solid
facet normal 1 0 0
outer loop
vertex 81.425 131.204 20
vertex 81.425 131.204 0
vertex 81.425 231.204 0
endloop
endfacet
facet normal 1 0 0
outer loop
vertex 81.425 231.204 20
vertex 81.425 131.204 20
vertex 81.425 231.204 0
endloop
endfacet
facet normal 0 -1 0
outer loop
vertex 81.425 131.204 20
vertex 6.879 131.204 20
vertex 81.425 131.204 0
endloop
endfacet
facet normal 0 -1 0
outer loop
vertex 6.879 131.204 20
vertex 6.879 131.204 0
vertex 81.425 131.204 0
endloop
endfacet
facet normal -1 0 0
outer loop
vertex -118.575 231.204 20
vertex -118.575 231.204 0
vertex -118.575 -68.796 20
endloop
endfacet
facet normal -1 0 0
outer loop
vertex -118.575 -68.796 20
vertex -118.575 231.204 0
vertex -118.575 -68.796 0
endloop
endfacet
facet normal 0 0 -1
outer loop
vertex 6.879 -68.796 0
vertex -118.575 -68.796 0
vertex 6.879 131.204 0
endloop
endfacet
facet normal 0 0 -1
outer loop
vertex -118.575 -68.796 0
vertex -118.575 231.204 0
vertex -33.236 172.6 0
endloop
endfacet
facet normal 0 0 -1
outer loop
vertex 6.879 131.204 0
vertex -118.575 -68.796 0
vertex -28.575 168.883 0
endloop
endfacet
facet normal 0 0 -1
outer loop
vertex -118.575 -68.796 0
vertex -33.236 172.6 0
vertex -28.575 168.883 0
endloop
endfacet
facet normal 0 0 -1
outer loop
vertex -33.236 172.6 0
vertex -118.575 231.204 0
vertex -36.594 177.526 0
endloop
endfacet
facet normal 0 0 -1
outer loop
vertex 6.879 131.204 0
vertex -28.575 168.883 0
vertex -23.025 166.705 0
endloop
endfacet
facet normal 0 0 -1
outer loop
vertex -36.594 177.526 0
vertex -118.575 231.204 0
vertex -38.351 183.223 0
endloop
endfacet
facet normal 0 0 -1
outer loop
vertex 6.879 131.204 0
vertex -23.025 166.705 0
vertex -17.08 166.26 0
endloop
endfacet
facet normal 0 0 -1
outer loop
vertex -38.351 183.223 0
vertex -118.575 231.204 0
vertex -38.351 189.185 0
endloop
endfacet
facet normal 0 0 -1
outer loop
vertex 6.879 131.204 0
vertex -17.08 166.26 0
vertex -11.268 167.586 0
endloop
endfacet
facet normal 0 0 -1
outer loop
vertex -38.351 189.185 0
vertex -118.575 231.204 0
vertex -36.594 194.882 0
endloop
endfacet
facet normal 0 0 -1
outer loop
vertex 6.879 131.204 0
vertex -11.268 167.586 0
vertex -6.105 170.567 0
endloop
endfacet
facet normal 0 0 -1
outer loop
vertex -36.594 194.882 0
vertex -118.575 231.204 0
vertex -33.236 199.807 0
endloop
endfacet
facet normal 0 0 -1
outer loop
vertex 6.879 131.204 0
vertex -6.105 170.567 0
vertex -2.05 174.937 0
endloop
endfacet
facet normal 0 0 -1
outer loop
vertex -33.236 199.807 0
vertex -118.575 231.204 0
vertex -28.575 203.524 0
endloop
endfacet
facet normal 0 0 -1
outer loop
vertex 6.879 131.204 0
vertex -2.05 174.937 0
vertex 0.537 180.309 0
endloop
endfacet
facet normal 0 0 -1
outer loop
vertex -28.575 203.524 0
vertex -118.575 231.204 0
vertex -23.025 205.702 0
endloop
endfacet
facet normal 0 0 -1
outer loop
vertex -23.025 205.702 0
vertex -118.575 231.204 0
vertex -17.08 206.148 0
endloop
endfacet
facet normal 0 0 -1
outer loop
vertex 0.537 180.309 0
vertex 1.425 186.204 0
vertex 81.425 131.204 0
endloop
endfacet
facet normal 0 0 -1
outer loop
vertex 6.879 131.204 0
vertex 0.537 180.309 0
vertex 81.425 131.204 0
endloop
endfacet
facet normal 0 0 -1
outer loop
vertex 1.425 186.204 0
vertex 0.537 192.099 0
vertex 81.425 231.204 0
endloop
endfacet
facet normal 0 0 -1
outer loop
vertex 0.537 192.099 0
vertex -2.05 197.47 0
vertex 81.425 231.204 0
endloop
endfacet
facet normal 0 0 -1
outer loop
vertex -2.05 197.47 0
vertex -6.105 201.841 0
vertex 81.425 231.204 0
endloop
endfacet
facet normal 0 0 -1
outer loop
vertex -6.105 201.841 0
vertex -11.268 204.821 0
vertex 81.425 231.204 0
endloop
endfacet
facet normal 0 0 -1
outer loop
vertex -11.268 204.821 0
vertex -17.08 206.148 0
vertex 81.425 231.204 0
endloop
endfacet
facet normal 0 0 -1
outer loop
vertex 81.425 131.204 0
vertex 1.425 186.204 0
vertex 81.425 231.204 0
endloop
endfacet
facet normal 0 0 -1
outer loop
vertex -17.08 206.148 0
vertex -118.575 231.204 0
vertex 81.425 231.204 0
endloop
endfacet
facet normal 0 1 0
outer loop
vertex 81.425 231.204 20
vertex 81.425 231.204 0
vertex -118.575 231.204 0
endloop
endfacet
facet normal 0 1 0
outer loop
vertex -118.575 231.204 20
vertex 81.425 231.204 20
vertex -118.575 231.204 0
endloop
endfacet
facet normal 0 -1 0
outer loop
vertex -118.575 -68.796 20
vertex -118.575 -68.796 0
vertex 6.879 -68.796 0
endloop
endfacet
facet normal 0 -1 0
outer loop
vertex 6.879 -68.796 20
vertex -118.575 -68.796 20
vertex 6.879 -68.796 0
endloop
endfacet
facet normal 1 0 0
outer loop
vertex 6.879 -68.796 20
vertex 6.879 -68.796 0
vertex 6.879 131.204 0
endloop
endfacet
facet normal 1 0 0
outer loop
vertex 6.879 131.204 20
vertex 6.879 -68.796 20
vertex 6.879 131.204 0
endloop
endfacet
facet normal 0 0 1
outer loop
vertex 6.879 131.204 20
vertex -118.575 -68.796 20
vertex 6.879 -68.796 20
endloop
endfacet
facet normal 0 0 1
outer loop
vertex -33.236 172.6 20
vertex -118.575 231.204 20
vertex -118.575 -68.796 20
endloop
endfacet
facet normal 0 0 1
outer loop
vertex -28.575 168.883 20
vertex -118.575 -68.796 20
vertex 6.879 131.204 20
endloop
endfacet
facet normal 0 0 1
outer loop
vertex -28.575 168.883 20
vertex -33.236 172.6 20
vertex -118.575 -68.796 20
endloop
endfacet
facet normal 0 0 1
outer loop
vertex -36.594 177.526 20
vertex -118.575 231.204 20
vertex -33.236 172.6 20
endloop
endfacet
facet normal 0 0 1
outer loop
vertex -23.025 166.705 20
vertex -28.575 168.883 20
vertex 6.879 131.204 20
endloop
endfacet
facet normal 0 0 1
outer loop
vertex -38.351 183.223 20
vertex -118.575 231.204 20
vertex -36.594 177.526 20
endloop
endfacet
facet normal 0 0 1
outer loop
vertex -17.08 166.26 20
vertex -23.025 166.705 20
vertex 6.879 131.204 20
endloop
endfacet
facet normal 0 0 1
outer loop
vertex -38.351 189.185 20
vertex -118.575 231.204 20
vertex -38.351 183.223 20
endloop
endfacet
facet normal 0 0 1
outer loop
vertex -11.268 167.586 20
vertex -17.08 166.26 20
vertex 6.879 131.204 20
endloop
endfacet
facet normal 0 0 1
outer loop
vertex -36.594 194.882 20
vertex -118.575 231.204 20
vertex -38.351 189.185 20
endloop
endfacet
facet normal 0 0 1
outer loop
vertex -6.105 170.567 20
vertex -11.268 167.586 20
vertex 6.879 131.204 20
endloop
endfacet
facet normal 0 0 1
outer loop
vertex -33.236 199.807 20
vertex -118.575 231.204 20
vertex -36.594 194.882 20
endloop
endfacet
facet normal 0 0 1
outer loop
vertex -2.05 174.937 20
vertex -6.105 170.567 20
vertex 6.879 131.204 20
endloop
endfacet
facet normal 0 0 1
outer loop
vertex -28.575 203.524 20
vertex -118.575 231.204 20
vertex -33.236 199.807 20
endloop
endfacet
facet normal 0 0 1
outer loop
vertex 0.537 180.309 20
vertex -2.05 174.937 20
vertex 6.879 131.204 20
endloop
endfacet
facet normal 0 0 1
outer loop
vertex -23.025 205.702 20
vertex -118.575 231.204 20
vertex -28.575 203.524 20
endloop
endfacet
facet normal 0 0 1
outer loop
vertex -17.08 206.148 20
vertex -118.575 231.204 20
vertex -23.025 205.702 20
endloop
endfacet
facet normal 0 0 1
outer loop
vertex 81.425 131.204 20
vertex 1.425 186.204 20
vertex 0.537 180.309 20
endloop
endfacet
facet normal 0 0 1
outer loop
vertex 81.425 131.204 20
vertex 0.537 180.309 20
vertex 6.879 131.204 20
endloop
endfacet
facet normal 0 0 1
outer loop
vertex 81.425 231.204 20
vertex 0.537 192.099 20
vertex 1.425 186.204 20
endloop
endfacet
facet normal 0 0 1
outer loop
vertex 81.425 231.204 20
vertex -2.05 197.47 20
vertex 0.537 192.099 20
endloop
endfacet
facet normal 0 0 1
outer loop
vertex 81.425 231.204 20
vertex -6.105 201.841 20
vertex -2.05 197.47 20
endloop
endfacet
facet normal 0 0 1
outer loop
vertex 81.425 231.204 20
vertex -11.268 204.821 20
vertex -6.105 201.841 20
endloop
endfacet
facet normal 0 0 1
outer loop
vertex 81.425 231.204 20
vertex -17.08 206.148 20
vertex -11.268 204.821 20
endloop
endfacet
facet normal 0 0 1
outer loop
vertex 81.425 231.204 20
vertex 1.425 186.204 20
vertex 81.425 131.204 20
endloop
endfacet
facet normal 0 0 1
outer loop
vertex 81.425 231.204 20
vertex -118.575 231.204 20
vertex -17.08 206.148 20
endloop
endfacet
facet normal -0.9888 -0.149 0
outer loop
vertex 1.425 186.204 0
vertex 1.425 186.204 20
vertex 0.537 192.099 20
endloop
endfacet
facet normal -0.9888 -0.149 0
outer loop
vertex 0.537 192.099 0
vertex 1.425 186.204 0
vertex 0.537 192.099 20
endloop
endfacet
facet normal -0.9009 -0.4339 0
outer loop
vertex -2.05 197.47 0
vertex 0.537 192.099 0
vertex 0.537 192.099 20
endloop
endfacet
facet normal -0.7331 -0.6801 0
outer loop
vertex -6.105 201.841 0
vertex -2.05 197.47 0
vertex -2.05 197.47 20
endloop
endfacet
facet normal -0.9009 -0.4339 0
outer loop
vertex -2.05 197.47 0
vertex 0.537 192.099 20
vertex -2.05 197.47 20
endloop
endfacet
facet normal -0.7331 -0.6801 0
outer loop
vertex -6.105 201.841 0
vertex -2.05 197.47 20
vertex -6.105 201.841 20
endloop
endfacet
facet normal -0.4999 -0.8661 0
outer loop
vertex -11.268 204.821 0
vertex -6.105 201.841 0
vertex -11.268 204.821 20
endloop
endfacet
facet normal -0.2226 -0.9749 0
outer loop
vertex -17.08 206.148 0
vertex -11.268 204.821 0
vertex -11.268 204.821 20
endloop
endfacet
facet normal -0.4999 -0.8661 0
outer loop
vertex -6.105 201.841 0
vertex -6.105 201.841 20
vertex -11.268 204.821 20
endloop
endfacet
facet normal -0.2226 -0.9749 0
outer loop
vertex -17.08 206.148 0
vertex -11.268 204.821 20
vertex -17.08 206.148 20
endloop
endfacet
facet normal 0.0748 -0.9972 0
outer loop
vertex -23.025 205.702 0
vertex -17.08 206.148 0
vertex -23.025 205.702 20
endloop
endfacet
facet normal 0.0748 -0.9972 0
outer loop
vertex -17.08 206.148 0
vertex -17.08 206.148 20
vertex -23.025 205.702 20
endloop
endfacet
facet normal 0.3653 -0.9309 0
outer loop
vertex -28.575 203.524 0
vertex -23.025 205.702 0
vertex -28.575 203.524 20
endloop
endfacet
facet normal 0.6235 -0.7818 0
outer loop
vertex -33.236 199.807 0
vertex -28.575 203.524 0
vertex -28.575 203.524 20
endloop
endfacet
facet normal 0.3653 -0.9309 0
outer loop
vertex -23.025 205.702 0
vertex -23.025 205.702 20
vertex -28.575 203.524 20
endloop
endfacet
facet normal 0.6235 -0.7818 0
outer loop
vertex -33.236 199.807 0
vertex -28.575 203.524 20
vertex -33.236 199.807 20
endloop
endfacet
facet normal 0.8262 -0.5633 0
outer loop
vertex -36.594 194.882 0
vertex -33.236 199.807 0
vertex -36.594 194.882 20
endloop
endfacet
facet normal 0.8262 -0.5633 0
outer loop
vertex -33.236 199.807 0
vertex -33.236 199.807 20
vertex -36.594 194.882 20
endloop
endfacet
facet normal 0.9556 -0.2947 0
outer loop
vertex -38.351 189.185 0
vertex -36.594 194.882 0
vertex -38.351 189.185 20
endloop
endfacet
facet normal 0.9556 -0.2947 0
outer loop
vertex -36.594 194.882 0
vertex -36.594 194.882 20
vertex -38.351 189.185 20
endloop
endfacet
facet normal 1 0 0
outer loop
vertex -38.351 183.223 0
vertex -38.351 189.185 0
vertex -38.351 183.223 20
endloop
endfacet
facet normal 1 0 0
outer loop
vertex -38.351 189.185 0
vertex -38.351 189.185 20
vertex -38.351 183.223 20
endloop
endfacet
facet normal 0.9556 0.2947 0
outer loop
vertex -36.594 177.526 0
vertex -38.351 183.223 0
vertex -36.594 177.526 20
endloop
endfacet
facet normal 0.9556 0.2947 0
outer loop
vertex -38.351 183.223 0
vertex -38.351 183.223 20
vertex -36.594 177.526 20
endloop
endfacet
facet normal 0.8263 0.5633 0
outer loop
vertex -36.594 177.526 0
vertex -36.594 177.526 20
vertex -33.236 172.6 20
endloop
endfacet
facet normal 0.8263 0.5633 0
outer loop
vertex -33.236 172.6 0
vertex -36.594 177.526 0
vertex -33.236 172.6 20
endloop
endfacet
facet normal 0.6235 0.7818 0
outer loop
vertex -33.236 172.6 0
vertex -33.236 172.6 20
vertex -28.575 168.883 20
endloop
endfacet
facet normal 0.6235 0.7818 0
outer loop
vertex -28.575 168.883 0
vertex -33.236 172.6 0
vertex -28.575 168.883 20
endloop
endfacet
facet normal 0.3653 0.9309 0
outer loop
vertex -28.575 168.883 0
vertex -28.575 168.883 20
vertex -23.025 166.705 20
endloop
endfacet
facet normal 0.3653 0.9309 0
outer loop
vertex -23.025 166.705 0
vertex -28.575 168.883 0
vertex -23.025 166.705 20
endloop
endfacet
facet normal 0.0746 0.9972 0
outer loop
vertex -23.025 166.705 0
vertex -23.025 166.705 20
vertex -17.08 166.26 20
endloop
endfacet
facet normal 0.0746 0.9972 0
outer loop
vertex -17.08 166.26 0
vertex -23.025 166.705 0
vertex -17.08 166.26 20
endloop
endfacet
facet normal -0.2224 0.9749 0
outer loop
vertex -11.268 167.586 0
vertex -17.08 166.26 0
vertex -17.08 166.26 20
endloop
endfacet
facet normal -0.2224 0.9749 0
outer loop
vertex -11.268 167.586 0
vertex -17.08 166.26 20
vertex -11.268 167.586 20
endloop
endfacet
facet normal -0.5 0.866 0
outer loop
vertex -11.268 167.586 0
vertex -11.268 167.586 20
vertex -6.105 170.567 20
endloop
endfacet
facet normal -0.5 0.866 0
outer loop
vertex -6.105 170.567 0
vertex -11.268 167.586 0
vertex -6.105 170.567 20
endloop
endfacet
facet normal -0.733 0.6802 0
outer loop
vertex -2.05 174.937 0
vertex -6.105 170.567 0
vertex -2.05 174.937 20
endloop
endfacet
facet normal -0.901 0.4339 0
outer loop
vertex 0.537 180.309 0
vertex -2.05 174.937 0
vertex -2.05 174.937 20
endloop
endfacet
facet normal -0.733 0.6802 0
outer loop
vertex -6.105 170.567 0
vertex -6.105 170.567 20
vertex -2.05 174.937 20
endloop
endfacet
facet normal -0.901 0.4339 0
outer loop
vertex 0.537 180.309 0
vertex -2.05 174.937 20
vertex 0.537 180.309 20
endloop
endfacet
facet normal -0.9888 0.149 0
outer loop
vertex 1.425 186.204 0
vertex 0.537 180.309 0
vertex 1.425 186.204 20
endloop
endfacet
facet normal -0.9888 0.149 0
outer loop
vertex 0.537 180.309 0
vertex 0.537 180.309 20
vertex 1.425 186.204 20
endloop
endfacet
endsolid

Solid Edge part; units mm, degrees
sketch "Sketch1" plane through (0, 0, 0) normal (0, 0, 1) x (1, 0, 0)
  line L0 (-118.5746, 131.2039) -> (-118.5746, -68.7961)
  line L1 (-118.5746, -68.7961) -> (6.8792, -68.7961)
  line L2 (6.8792, -68.7961) -> (6.8792, 131.2039)
  line L3 (6.8792, 131.2039) -> (-118.5746, 131.2039)
  line L4 (-118.5746, 131.2039) -> (81.4254, 131.2039)
  line L5 (81.4254, 131.2039) -> (81.4254, 231.2039)
  line L6 (81.4254, 231.2039) -> (-118.5746, 231.2039)
  line L7 (-118.5746, 231.2039) -> (-118.5746, 131.2039)
  dimension "D1" = 200
  dimension "D2" = 100
  dimension "D3" = 200
extrude "Protrusion1" add sketch "Sketch1" along normal blind 20
sketch "Sketch2" plane through (-18.5746, 131.2039, 20) normal (0, 0, 1) x (1, 0, 0)
  circle A0 centre (0, 55) radius 20
  dimension "D1" = 45
extrude "Cutout1" cut sketch "Sketch2" against normal through all
